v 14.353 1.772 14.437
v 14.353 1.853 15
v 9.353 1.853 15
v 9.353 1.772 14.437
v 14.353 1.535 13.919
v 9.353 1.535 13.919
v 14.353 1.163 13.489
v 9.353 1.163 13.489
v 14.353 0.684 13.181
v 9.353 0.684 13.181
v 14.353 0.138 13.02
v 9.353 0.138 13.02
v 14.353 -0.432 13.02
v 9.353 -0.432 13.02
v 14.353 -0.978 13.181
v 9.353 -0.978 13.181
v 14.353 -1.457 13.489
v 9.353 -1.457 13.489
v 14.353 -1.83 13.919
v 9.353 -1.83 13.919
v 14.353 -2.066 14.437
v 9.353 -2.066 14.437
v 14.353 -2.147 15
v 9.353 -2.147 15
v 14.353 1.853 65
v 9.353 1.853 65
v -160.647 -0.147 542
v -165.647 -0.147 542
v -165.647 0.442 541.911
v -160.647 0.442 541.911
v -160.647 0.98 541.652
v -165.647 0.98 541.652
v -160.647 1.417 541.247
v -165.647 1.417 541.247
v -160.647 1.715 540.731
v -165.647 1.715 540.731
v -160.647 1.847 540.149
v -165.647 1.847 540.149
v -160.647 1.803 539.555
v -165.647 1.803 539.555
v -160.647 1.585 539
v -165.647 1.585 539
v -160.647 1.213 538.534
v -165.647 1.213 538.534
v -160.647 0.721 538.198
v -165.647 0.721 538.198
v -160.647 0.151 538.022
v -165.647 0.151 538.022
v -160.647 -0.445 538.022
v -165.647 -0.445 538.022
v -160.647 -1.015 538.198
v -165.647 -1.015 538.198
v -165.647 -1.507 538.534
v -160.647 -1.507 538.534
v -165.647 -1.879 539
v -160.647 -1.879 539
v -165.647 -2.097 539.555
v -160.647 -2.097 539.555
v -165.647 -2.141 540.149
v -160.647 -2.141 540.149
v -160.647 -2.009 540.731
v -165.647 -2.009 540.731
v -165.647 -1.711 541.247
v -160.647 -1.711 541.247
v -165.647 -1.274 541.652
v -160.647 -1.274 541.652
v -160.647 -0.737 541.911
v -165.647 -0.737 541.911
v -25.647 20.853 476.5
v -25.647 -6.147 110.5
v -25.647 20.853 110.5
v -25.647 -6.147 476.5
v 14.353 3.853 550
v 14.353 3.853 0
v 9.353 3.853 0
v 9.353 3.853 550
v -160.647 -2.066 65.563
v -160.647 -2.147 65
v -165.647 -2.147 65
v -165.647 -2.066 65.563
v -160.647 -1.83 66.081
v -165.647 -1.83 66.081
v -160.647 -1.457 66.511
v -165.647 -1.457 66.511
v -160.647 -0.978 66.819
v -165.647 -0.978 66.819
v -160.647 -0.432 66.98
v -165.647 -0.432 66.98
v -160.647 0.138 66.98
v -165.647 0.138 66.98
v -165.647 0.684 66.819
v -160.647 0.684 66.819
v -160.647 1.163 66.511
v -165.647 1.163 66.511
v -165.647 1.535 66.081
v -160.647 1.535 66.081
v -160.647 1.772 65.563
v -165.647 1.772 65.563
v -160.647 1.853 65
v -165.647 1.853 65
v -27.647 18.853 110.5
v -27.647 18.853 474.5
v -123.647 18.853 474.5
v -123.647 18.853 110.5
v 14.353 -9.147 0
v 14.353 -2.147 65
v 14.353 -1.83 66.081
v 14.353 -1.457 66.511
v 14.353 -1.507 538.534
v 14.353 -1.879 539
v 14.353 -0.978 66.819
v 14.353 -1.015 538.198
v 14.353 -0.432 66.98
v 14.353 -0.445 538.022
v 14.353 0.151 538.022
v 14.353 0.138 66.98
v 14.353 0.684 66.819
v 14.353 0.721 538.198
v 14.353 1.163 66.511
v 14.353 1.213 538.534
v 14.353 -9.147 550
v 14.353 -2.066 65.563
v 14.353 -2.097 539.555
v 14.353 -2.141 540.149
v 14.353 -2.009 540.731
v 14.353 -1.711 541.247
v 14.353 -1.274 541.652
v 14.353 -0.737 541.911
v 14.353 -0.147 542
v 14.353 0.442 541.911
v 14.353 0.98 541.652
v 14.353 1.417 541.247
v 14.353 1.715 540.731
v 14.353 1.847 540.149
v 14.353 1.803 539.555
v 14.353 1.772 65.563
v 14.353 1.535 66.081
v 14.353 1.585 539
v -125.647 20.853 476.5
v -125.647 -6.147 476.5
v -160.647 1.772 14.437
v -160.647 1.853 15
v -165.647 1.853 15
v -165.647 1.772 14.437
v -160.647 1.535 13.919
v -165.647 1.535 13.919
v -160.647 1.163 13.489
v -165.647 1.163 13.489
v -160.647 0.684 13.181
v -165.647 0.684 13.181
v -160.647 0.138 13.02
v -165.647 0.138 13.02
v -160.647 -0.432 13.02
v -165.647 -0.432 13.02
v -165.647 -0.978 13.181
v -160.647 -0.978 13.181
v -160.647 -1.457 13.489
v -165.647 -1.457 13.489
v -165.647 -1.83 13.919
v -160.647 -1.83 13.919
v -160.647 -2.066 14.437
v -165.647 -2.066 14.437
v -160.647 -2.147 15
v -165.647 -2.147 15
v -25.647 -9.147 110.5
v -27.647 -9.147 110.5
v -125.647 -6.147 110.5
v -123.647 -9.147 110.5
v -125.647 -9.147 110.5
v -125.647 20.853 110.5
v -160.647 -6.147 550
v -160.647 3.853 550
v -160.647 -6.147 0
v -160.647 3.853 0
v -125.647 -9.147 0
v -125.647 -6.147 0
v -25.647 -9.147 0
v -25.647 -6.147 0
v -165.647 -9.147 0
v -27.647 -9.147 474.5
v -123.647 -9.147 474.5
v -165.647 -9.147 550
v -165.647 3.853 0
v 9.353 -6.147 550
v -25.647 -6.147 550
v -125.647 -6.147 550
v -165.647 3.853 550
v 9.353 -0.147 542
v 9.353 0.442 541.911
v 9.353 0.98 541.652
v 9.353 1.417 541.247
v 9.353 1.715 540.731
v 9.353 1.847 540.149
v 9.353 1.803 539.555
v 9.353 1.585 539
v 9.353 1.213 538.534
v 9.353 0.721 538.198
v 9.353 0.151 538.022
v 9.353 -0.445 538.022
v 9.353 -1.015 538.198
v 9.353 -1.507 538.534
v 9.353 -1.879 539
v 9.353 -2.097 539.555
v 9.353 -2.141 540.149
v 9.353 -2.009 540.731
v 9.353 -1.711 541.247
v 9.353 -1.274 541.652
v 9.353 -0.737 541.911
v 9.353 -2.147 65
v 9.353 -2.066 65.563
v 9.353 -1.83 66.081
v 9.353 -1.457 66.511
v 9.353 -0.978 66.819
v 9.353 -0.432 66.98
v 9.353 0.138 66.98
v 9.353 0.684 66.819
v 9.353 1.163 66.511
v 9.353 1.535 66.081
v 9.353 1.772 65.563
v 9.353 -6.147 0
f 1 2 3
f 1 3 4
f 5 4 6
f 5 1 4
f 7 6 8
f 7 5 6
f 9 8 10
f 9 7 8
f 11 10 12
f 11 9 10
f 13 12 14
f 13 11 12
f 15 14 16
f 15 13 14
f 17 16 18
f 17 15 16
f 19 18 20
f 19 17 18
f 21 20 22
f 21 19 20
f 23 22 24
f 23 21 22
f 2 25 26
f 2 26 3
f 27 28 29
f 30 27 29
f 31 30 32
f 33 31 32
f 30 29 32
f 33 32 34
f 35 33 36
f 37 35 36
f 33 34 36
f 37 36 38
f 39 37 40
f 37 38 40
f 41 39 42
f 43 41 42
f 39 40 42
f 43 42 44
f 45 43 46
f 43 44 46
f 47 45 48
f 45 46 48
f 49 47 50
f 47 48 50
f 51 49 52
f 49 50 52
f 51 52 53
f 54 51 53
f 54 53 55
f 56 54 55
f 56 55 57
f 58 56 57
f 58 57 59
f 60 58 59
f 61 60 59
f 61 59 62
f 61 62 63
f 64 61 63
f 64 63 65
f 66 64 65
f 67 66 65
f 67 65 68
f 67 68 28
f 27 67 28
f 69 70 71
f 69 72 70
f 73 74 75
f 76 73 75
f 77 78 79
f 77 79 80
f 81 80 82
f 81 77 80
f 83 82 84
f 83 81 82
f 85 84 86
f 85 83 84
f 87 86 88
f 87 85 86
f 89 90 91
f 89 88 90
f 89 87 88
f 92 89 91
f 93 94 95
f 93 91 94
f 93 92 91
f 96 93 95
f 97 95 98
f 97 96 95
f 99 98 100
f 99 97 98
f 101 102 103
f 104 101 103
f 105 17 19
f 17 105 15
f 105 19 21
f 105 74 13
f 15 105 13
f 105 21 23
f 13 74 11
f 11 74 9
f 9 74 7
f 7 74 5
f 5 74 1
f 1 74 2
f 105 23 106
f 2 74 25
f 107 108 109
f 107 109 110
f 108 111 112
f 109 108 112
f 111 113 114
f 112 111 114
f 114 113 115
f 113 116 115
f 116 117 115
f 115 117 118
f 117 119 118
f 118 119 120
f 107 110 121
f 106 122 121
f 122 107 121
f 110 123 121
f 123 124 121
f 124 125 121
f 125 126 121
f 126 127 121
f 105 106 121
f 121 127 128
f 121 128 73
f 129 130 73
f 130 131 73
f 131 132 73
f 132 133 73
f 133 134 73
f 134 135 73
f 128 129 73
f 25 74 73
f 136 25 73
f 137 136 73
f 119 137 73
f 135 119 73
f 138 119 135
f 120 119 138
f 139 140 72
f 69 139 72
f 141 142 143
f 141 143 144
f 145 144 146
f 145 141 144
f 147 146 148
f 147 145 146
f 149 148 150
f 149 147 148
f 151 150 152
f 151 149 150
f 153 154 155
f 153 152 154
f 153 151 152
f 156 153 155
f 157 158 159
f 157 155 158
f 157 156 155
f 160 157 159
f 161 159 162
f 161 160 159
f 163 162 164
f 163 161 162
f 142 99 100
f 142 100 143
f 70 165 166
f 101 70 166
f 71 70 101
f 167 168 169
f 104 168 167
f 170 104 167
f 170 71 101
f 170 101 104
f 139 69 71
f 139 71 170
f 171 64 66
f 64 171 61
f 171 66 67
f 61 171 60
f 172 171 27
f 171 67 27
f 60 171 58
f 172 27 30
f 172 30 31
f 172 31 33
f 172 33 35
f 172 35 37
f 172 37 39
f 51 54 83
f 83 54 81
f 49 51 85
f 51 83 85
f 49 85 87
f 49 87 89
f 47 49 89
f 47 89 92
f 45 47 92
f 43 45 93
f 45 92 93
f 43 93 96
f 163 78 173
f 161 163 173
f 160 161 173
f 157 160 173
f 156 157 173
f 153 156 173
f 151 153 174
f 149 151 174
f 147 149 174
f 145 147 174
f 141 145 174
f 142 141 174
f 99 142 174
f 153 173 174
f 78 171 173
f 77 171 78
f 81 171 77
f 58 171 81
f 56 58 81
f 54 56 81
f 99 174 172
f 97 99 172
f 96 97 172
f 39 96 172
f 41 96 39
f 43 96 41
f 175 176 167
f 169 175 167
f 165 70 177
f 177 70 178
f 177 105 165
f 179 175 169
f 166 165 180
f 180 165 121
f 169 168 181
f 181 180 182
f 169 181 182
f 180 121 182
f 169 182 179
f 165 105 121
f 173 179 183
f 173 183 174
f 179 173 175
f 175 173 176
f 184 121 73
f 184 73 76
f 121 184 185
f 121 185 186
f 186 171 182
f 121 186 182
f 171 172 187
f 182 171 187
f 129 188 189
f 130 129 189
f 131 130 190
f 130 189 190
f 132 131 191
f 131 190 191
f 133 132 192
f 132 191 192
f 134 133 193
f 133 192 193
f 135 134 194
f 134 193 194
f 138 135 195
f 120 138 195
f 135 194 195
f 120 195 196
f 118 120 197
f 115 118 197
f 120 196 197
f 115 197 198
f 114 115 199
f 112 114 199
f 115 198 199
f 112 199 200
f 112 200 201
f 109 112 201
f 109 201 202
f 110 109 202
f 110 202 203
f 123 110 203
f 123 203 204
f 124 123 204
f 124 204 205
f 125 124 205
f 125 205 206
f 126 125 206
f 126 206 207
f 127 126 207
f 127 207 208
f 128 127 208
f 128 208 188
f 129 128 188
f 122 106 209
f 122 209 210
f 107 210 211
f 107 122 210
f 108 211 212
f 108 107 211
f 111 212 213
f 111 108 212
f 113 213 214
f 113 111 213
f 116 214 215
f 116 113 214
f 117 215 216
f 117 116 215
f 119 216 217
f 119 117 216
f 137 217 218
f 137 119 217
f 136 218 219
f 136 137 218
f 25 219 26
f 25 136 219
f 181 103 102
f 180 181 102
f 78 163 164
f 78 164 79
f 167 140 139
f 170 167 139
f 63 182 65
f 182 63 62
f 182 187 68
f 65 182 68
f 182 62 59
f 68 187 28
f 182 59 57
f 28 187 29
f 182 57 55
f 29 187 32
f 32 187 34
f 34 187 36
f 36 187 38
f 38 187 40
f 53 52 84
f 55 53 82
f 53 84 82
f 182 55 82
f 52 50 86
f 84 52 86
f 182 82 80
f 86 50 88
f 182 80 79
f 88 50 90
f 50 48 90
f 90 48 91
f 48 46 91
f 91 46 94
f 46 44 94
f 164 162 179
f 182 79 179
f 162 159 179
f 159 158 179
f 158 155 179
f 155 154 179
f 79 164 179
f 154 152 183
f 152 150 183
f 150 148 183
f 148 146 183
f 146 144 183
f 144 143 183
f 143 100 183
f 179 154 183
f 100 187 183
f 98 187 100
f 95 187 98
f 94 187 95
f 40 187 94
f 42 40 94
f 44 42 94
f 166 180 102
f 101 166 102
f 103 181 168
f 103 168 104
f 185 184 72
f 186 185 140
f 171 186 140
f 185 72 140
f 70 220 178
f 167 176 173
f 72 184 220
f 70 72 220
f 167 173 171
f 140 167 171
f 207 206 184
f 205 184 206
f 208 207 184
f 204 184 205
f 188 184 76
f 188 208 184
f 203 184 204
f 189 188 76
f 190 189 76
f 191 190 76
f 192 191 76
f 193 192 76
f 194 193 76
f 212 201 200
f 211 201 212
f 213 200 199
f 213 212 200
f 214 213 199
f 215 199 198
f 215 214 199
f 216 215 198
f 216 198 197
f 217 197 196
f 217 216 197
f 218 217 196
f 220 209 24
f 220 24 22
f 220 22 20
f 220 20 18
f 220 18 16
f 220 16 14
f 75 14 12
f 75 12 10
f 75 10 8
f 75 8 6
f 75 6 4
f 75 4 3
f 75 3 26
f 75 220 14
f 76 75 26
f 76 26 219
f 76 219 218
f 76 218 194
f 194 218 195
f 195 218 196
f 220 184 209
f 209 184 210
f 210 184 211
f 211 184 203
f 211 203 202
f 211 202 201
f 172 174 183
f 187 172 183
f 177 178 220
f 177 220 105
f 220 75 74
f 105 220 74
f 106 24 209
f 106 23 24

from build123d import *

# Parameters (mm, degrees)
BOSS_EXTRUDE1_DEPTH   = 550
F_4_0MM_DOWEL_HOLE1_D = 4
CUT_EXTRUDE1_DEPTH    = 579.75873098
SKETCH7_W             = 100
SKETCH7_H             = 409.5
CUT_EXTRUDE2_DEPTH    = 575.598945437
SKETCH8_W             = 100
SKETCH8_H             = 2
BOSS_EXTRUDE2_DEPTH   = 23
SKETCH9_W             = 100
SKETCH9_H             = 2
BOSS_EXTRUDE3_DEPTH   = 364
SKETCH10_W            = 100
SKETCH10_H            = 64.953820437
CUT_EXTRUDE3_DEPTH    = 364
SKETCH11_W            = 100
SKETCH11_H            = 35.696147614
CUT_EXTRUDE4_DEPTH    = 364
SKETCH12_W            = 5
SKETCH12_H            = 4
CUT_EXTRUDE6_DEPTH    = 575.781517842
SKETCH13_W            = 35
SKETCH13_H            = 2
CUT_EXTRUDE7_DEPTH    = 575.781517842
BOSS_EXTRUDE4_DEPTH   = 2
SKETCH15_W            = 35
SKETCH15_H            = 2
CUT_EXTRUDE8_DEPTH    = 575.781517842
SKETCH18_W            = 100
SKETCH18_H            = 7.149859065
CUT_EXTRUDE10_DEPTH   = 73.5
SKETCH22_W            = 2
SKETCH22_H            = 28
BOSS_EXTRUDE8_DEPTH   = 364
SKETCH24_W            = 2
SKETCH24_H            = 28
BOSS_EXTRUDE9_DEPTH   = 364


with BuildPart() as part:
    # Sketch1 → Boss-Extrude1 (new body)
    with BuildSketch(Plane.XY):
        Polygon((-165.647058824, 7.852941176), (-165.647058824, -7.147058824), (14.352941176, -7.147058824), (14.352941176, 7.852941176), (9.352941176, 7.852941176), (9.352941176, -2.147058824), (-160.647058824, -2.147058824), (-160.647058824, 7.852941176), align=None)
    extrude(amount=BOSS_EXTRUDE1_DEPTH)

    # Ø4.0mm Dowel Hole1 (through all)
    with Locations(Plane(origin=(14.352941176, 0, 0), x_dir=(0, 0, -1), z_dir=(1, 0, 0))):
        with Locations((-540, -0.147058824)):
            Hole(F_4_0MM_DOWEL_HOLE1_D / 2)

    # Sketch5 → Cut-Extrude1 (cut, through all)
    with BuildSketch(Plane(origin=(14.352941176, 0, 0), x_dir=(0, 0, -1), z_dir=(1, 0, 0))):
        with BuildLine():
            Line((-65, 1.852941176), (-15, 1.852941176))
            ThreePointArc((-15, 1.852941176), (-13, -0.147058824), (-15, -2.147058824))
            Line((-15, -2.147058824), (-65, -2.147058824))
            ThreePointArc((-65, -2.147058824), (-67, -0.147058824), (-65, 1.852941176))
        make_face()
    extrude(amount=-CUT_EXTRUDE1_DEPTH, mode=Mode.SUBTRACT)

    # Sketch7 → Cut-Extrude2 (cut, through all)
    with BuildSketch(Plane.XZ.offset(7.147058824)):
        with Locations((-75.647058824, 269.75)):
            Rectangle(SKETCH7_W, SKETCH7_H)
    extrude(amount=-CUT_EXTRUDE2_DEPTH, mode=Mode.SUBTRACT)

    # Sketch8 → Boss-Extrude2 (add)
    with BuildSketch(Plane(origin=(0, -2.147058824, 0), x_dir=(1, 0, 0), z_dir=(0, 1, 0))):
        with Locations((-75.647058824, -475.5)):
            Rectangle(SKETCH8_W, SKETCH8_H)
    extrude(amount=BOSS_EXTRUDE2_DEPTH)

    # Sketch9 → Boss-Extrude3 (add)
    with BuildSketch(Plane(origin=(0, 0, 474.5), x_dir=(-1, 0, 0), z_dir=(0, 0, -1))):
        with Locations((75.647058824, 19.852941176)):
            Rectangle(SKETCH9_W, SKETCH9_H)
    extrude(amount=BOSS_EXTRUDE3_DEPTH)

    # Sketch10 → Cut-Extrude3 (cut)
    with BuildSketch(Plane.XZ.offset(7.147058824)):
        with Locations((-75.647058824, 32.523089781)):
            Rectangle(SKETCH10_W, SKETCH10_H)
    extrude(amount=-CUT_EXTRUDE3_DEPTH, mode=Mode.SUBTRACT)

    # Sketch11 → Cut-Extrude4 (cut)
    with BuildSketch(Plane.XZ.offset(7.147058824)):
        with Locations((-75.647058824, -10.567416996)):
            Rectangle(SKETCH11_W, SKETCH11_H)
    extrude(amount=-CUT_EXTRUDE4_DEPTH, mode=Mode.SUBTRACT)

    # Sketch12 → Cut-Extrude6 (cut, through all)
    with BuildSketch(Plane(origin=(0, 0, 0), x_dir=(-1, 0, 0), z_dir=(0, 0, -1))):
        with Locations((-11.852941176, 5.852941176)):
            Rectangle(SKETCH12_W, SKETCH12_H)
        with Locations((163.147058824, 5.852941176)):
            Rectangle(SKETCH12_W, SKETCH12_H)
    extrude(amount=-CUT_EXTRUDE6_DEPTH, mode=Mode.SUBTRACT)

    # Sketch13 → Cut-Extrude7 (cut, through all)
    with BuildSketch(Plane(origin=(0, 0, 0), x_dir=(-1, 0, 0), z_dir=(0, 0, -1))):
        with Locations((8.147058824, -3.147058824)):
            Rectangle(SKETCH13_W, SKETCH13_H)
        with Locations((143.147058824, -3.147058824)):
            Rectangle(SKETCH13_W, SKETCH13_H)
    extrude(amount=-CUT_EXTRUDE7_DEPTH, mode=Mode.SUBTRACT)

    # Sketch14 → Boss-Extrude4 (add)
    with BuildSketch(Plane.XZ.offset(7.147058824)):
        Polygon((-165.647058824, 0), (-125.647058824, 0), (-125.647058824, 474.5), (-25.647058824, 474.5), (-25.647058824, 0), (14.352941176, 0), (14.352941176, 550), (-165.647058824, 550), align=None)
    extrude(amount=BOSS_EXTRUDE4_DEPTH)

    # Sketch15 → Cut-Extrude8 (cut, through all)
    with BuildSketch(Plane(origin=(0, 0, 0), x_dir=(-1, 0, 0), z_dir=(0, 0, -1))):
        with Locations((143.147058824, -5.147058824)):
            Rectangle(SKETCH15_W, SKETCH15_H)
        with Locations((8.147058824, -5.147058824)):
            Rectangle(SKETCH15_W, SKETCH15_H)
    extrude(amount=-CUT_EXTRUDE8_DEPTH, mode=Mode.SUBTRACT)

    # Sketch18 → Cut-Extrude10 (cut)
    with BuildSketch(Plane.XY.offset(550)):
        with Locations((-75.647058824, -2.572129292)):
            Rectangle(SKETCH18_W, SKETCH18_H)
    extrude(amount=-CUT_EXTRUDE10_DEPTH, mode=Mode.SUBTRACT)

    # Sketch22 → Boss-Extrude8 (add)
    with BuildSketch(Plane(origin=(0, 0, 474.5), x_dir=(-1, 0, 0), z_dir=(0, 0, -1))):
        with Locations((124.647058824, 4.852941176)):
            Rectangle(SKETCH22_W, SKETCH22_H)
    extrude(amount=BOSS_EXTRUDE8_DEPTH)

    # Sketch24 → Boss-Extrude9 (add)
    with BuildSketch(Plane(origin=(0, 0, 474.5), x_dir=(-1, 0, 0), z_dir=(0, 0, -1))):
        with Locations((26.647058824, 4.852941176)):
            Rectangle(SKETCH24_W, SKETCH24_H)
    extrude(amount=BOSS_EXTRUDE9_DEPTH)


solid = part.part
